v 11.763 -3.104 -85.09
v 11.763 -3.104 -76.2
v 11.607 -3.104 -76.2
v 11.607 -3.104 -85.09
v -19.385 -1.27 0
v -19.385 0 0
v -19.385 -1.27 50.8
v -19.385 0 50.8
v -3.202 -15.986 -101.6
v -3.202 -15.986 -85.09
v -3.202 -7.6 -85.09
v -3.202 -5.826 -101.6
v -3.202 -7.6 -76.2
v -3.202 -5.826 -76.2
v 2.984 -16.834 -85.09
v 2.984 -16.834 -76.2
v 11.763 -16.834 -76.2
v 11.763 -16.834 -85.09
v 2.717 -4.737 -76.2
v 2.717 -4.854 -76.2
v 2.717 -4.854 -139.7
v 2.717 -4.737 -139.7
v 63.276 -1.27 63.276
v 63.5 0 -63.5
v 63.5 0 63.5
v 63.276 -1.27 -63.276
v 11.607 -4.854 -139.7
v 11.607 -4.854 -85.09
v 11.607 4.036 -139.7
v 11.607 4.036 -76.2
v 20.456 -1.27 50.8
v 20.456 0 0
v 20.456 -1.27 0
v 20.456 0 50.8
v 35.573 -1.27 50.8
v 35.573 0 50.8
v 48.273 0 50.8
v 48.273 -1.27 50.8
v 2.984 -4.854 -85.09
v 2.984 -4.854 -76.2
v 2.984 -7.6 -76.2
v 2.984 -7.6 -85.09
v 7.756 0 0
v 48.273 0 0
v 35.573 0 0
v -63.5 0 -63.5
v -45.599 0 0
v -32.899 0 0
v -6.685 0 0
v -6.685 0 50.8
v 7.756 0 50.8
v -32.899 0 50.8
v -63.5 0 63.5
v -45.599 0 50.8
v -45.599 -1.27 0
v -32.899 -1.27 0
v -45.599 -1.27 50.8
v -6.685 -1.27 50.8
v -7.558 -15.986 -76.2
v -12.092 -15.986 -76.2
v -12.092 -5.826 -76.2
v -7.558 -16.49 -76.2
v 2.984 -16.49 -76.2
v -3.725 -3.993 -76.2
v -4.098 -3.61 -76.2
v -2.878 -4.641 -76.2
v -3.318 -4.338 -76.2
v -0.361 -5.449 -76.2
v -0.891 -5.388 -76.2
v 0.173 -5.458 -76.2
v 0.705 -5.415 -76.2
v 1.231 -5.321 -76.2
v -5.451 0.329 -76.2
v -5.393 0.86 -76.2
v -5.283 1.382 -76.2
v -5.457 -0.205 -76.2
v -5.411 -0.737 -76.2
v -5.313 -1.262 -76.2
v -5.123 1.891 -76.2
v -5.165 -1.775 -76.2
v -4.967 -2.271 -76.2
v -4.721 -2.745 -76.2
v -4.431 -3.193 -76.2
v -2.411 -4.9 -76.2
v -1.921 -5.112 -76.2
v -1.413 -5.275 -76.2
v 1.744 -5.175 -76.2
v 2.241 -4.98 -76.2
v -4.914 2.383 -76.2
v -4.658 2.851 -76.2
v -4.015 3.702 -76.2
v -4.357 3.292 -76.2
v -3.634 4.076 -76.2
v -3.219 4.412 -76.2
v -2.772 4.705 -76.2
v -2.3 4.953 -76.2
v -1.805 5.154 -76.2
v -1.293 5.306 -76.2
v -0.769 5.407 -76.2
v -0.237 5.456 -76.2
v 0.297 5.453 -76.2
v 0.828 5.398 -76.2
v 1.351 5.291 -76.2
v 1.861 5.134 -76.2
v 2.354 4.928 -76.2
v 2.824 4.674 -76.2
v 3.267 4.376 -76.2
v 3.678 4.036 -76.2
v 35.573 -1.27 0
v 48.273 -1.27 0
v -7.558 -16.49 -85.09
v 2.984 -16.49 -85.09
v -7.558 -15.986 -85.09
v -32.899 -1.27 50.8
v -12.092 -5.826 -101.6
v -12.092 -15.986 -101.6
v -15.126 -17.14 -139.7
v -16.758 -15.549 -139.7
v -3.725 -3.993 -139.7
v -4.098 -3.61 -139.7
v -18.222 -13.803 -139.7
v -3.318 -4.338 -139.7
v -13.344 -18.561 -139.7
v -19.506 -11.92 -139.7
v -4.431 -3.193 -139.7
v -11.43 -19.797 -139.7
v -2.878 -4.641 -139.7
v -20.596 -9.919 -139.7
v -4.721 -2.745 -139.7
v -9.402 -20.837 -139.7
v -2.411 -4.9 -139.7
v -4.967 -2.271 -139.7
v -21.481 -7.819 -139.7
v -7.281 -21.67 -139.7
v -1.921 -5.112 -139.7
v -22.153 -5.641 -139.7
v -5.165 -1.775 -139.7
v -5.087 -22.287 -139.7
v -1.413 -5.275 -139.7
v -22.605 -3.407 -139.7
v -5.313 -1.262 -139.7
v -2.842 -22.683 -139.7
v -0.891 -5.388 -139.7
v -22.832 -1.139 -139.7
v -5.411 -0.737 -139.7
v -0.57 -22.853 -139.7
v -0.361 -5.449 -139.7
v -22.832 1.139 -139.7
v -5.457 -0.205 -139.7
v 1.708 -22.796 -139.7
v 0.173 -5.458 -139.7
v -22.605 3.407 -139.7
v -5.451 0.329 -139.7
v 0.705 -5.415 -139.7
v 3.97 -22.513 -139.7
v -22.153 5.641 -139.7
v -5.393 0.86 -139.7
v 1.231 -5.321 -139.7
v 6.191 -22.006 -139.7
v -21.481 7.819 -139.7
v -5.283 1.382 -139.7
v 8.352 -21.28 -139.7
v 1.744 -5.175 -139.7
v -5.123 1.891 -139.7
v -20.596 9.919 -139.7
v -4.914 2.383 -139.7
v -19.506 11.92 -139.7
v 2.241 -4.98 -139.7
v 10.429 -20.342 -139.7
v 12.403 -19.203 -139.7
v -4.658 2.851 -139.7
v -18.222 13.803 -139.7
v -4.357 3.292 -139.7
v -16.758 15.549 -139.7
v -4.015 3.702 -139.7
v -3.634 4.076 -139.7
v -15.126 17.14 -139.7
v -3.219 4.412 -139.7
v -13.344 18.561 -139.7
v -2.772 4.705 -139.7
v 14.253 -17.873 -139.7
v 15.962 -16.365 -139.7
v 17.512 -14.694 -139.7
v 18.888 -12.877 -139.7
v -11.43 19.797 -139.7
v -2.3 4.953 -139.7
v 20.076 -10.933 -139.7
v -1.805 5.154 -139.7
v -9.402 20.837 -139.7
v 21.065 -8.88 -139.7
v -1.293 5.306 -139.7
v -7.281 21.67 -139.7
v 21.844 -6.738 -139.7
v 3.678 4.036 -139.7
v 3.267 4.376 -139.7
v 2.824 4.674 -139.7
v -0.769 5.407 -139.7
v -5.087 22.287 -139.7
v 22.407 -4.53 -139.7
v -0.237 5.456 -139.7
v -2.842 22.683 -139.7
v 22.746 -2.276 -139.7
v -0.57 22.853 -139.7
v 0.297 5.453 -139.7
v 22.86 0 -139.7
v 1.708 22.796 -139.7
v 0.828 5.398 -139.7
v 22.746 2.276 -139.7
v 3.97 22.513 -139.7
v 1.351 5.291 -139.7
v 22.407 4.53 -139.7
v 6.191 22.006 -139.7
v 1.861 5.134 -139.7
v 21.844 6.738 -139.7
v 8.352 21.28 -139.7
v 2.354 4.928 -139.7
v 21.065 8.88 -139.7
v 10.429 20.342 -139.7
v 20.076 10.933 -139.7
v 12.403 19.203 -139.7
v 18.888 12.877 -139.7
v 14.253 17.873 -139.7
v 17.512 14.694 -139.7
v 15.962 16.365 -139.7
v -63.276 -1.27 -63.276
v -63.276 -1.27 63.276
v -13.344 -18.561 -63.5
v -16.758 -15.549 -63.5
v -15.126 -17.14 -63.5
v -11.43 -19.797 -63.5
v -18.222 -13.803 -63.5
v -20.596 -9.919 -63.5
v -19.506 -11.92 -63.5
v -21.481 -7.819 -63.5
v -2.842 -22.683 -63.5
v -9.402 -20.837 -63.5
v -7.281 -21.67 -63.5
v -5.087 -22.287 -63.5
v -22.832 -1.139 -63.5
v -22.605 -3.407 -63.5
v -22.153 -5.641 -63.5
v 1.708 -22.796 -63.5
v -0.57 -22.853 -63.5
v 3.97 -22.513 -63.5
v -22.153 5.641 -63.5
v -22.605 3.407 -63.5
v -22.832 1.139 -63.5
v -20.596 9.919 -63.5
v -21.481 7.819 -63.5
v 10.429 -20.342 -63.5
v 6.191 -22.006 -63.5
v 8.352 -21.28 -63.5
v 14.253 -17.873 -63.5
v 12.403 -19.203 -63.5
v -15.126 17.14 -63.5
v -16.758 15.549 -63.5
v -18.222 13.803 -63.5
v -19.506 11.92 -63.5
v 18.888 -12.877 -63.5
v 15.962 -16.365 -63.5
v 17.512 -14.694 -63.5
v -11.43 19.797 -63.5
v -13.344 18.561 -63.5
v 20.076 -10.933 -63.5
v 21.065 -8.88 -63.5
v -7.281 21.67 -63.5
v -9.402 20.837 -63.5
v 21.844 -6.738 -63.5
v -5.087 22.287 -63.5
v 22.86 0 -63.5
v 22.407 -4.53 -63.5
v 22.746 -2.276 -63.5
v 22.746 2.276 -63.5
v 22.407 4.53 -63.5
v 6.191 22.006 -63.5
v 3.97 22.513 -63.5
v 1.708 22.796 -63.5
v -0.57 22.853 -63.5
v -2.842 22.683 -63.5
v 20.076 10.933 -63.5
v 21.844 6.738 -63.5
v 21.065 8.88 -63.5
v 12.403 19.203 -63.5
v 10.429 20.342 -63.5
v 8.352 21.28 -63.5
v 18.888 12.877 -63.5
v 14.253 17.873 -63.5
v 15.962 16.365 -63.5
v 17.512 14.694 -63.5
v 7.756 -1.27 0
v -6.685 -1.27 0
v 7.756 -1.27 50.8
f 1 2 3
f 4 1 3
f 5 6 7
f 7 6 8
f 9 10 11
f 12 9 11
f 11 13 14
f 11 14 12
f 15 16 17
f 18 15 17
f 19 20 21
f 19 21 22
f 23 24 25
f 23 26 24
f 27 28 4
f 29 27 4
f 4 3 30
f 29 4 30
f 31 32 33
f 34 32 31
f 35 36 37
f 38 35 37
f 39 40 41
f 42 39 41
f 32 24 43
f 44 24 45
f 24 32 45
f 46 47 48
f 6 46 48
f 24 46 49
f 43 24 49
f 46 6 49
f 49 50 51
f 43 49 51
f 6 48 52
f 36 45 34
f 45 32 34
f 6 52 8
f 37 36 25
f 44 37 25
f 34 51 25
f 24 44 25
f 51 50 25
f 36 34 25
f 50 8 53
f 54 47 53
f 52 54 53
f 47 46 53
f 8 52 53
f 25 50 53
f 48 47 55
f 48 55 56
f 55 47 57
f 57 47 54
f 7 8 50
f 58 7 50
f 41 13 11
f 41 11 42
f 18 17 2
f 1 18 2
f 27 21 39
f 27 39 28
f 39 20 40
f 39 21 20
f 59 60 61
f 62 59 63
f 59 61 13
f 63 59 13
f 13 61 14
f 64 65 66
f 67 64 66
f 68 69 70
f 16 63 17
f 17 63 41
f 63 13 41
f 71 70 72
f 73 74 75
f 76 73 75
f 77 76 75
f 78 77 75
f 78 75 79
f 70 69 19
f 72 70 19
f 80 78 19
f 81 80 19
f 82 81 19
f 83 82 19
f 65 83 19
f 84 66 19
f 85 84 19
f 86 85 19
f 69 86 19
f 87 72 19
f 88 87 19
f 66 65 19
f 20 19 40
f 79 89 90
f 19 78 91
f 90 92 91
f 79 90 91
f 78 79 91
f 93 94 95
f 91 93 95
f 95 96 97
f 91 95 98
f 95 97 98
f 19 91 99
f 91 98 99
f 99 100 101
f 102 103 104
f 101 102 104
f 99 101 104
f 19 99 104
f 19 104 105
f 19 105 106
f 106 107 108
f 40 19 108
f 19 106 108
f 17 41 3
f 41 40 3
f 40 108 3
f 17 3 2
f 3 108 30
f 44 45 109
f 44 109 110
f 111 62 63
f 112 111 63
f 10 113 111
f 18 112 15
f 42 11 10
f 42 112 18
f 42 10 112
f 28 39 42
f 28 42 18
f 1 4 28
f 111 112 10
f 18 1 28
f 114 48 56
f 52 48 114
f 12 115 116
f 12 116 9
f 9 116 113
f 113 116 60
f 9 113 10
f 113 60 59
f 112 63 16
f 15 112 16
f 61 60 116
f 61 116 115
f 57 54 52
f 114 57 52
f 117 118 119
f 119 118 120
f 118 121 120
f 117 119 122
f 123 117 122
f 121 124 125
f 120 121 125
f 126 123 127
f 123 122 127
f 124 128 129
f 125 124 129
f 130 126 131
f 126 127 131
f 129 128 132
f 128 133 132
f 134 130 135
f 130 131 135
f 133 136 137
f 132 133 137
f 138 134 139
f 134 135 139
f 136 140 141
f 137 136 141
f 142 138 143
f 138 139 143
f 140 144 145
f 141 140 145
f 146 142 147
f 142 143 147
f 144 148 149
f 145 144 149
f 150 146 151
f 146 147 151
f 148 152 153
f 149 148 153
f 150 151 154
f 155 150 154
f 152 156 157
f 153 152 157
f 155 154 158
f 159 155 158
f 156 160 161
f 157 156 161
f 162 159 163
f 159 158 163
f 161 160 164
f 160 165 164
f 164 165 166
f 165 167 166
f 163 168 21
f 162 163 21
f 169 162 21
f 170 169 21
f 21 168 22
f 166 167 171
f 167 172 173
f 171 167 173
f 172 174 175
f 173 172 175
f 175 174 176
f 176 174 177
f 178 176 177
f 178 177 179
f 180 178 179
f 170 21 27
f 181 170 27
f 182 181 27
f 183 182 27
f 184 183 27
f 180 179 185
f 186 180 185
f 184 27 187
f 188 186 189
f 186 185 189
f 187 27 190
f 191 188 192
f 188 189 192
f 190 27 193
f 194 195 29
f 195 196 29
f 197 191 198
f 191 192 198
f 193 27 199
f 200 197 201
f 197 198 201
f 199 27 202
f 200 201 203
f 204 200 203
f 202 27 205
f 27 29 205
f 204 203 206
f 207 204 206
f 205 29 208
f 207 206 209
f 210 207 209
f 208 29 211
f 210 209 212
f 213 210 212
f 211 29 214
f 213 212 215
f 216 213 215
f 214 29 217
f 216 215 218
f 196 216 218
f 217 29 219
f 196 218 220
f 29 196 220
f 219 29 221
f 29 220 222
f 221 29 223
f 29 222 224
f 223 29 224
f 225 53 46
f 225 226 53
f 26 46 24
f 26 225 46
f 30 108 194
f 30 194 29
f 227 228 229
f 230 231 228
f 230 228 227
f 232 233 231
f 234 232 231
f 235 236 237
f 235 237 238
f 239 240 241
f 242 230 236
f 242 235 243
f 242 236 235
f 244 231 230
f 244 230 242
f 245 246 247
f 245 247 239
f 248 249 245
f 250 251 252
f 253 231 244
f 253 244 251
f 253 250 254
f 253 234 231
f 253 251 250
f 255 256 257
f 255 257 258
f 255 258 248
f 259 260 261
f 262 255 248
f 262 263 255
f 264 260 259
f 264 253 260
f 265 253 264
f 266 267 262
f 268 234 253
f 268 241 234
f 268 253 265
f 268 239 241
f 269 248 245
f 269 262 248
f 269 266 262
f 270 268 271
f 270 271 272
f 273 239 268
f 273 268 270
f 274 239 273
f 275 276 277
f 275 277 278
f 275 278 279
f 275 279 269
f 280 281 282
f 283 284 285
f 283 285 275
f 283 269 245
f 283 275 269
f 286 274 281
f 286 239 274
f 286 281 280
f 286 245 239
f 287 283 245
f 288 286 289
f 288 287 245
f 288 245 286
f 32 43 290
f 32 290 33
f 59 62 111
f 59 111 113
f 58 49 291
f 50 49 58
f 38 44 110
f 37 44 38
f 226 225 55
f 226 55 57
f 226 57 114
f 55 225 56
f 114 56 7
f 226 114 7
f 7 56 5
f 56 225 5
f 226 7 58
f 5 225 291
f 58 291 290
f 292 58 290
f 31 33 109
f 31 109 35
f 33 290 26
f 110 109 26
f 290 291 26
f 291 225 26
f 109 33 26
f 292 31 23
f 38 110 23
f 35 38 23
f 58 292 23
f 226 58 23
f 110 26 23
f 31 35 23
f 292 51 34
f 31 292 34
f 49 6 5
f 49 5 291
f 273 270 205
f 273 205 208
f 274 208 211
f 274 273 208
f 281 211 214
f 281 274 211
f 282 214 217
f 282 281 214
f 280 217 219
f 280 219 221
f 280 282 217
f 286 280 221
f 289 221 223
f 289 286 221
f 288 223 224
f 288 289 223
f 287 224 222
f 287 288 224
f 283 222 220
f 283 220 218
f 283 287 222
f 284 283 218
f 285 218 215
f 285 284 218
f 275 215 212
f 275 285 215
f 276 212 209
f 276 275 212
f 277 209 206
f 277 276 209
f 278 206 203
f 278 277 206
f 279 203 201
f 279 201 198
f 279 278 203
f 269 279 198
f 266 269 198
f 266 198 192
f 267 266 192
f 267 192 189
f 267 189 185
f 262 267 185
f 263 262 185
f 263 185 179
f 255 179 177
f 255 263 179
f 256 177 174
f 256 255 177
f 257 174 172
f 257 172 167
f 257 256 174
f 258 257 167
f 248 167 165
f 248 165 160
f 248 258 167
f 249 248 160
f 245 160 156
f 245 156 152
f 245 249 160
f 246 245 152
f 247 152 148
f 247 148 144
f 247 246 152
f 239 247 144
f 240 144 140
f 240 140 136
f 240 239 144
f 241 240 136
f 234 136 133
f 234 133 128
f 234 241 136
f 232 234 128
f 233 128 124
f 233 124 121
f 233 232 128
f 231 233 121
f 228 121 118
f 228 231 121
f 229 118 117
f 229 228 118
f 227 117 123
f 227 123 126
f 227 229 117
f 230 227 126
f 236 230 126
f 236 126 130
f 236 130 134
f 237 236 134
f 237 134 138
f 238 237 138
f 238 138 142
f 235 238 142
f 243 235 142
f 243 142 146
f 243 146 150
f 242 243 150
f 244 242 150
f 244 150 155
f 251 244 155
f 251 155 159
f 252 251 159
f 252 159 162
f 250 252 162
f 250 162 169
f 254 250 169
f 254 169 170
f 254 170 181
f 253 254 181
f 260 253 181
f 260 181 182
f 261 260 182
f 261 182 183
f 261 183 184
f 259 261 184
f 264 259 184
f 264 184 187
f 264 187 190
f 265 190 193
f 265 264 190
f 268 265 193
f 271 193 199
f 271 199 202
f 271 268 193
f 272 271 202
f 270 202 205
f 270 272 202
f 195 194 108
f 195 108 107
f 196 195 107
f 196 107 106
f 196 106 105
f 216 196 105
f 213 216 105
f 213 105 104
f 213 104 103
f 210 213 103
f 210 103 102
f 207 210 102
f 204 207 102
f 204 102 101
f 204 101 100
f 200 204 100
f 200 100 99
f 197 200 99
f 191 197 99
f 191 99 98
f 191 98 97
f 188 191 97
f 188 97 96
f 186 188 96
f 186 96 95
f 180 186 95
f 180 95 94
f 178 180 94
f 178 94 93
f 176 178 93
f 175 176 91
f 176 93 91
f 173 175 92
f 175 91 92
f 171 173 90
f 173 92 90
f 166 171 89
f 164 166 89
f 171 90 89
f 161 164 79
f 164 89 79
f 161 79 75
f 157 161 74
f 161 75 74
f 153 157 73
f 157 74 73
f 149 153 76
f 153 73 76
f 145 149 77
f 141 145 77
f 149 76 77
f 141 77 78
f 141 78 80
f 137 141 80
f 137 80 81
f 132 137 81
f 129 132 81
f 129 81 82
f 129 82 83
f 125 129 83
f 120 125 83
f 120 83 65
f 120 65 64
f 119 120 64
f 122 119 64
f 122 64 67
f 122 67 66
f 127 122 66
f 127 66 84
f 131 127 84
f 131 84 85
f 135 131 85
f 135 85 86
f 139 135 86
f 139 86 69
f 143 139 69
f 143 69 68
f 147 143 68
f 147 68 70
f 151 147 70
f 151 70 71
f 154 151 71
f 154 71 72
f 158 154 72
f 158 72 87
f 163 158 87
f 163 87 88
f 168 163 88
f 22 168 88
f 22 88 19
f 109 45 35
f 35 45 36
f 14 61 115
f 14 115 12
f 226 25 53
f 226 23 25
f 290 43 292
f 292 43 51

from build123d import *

# Parameters (mm, degrees)
F0_W      = 127
F0_H      = 127
F1_DEPTH  = 1.27
F1_TAPER  = 10
F2_W      = 12.7
F2_H      = 50.8
F3_DEPTH  = 25.4
F4_W      = 12.7
F4_H      = 50.8
F5_DEPTH  = 25.4
F6_W      = 12.7
F6_H      = 50.8
F7_DEPTH  = 25.4
F9_R      = 22.86
F10_DEPTH = 76.2
F12_R     = 5.461
F13_DEPTH = 69.85
F14_W     = 8.89
F14_H     = 8.89
F15_DEPTH = 63.5
F16_W     = 10.5418048302
F16_H     = 8.89
F16_W_2   = 0.8881951698
F17_DEPTH = 8.89
F18_W     = 8.89
F18_H     = 10.16
F19_DEPTH = 25.4
F20_W     = 12.7
F20_H     = 50.8
F21_DEPTH = 25.4


with BuildPart() as f1:
    # F0 (on Front) → F1 (new body)
    with BuildSketch(Plane.XZ):
        Rectangle(F0_W, F0_H)
    extrude(amount=F1_DEPTH, taper=F1_TAPER)

    # F2 (on Front) → F3 (cut)
    with BuildSketch(Plane.XZ):
        with Locations((-39.2489836045, 25.4)):
            Rectangle(F2_W, F2_H)
    extrude(amount=F3_DEPTH, mode=Mode.SUBTRACT)

    # F4 (on Front) → F5 (cut)
    with BuildSketch(Plane.XZ):
        with Locations((-13.0347667253, 25.4)):
            Rectangle(F4_W, F4_H)
    extrude(amount=F5_DEPTH, mode=Mode.SUBTRACT)

    # F6 (on Front) → F7 (cut)
    with BuildSketch(Plane.XZ):
        with Locations((14.1064846767, 25.4)):
            Rectangle(F6_W, F6_H)
    extrude(amount=F7_DEPTH, mode=Mode.SUBTRACT)

    # F20 (on Front) → F21 (cut)
    with BuildSketch(Plane.XZ):
        with Locations((41.9227403533, 25.4)):
            Rectangle(F20_W, F20_H)
    extrude(amount=F21_DEPTH, mode=Mode.SUBTRACT)


with BuildPart() as f10:
    # F9 (on offset) → F10 (new body)
    with BuildSketch(Plane.XY.offset(-63.5)):
        Circle(F9_R)
    extrude(amount=-F10_DEPTH)

    # F12 (on offset) → F13 (cut)
    with BuildSketch(Plane.XY.offset(-76.2)):
        Circle(F12_R)
    extrude(amount=-F13_DEPTH, mode=Mode.SUBTRACT)

    # F14 (on offset) → F15 (cut)
    with BuildSketch(Plane.XY.offset(-76.2)):
        with Locations((7.1619835918, -0.4086584279)):
            Rectangle(F14_W, F14_H)
    extrude(amount=-F15_DEPTH, mode=Mode.SUBTRACT)

    # F16 (on offset) → F17 (cut)
    with BuildSketch(Plane.XY.offset(-76.2)):
        Polygon((2.9842855466, -16.4900656129), (2.9842855466, -16.8343085844), (11.7625715211, -16.8343085844), (11.7625715211, -3.1040124595), (2.9842855466, -3.1040124595), (2.9842855466, -7.6000656129), (3.8724807164, -7.6000656129), (3.8724807164, -16.4900656129), align=None)
        with Locations((-2.2866168685, -12.0450656129)):
            Rectangle(F16_W, F16_H)
        with Locations((3.4283831315, -12.0450656129)):
            Rectangle(F16_W_2, F16_H)
    extrude(amount=-F17_DEPTH, mode=Mode.SUBTRACT)

    # F18 (on offset) → F19 (cut)
    with BuildSketch(Plane.XY.offset(-76.2)):
        with Locations((-7.6468620378, -10.9055079202)):
            Rectangle(F18_W, F18_H)
    extrude(amount=-F19_DEPTH, mode=Mode.SUBTRACT)


solid = Compound([f1.part, f10.part])
